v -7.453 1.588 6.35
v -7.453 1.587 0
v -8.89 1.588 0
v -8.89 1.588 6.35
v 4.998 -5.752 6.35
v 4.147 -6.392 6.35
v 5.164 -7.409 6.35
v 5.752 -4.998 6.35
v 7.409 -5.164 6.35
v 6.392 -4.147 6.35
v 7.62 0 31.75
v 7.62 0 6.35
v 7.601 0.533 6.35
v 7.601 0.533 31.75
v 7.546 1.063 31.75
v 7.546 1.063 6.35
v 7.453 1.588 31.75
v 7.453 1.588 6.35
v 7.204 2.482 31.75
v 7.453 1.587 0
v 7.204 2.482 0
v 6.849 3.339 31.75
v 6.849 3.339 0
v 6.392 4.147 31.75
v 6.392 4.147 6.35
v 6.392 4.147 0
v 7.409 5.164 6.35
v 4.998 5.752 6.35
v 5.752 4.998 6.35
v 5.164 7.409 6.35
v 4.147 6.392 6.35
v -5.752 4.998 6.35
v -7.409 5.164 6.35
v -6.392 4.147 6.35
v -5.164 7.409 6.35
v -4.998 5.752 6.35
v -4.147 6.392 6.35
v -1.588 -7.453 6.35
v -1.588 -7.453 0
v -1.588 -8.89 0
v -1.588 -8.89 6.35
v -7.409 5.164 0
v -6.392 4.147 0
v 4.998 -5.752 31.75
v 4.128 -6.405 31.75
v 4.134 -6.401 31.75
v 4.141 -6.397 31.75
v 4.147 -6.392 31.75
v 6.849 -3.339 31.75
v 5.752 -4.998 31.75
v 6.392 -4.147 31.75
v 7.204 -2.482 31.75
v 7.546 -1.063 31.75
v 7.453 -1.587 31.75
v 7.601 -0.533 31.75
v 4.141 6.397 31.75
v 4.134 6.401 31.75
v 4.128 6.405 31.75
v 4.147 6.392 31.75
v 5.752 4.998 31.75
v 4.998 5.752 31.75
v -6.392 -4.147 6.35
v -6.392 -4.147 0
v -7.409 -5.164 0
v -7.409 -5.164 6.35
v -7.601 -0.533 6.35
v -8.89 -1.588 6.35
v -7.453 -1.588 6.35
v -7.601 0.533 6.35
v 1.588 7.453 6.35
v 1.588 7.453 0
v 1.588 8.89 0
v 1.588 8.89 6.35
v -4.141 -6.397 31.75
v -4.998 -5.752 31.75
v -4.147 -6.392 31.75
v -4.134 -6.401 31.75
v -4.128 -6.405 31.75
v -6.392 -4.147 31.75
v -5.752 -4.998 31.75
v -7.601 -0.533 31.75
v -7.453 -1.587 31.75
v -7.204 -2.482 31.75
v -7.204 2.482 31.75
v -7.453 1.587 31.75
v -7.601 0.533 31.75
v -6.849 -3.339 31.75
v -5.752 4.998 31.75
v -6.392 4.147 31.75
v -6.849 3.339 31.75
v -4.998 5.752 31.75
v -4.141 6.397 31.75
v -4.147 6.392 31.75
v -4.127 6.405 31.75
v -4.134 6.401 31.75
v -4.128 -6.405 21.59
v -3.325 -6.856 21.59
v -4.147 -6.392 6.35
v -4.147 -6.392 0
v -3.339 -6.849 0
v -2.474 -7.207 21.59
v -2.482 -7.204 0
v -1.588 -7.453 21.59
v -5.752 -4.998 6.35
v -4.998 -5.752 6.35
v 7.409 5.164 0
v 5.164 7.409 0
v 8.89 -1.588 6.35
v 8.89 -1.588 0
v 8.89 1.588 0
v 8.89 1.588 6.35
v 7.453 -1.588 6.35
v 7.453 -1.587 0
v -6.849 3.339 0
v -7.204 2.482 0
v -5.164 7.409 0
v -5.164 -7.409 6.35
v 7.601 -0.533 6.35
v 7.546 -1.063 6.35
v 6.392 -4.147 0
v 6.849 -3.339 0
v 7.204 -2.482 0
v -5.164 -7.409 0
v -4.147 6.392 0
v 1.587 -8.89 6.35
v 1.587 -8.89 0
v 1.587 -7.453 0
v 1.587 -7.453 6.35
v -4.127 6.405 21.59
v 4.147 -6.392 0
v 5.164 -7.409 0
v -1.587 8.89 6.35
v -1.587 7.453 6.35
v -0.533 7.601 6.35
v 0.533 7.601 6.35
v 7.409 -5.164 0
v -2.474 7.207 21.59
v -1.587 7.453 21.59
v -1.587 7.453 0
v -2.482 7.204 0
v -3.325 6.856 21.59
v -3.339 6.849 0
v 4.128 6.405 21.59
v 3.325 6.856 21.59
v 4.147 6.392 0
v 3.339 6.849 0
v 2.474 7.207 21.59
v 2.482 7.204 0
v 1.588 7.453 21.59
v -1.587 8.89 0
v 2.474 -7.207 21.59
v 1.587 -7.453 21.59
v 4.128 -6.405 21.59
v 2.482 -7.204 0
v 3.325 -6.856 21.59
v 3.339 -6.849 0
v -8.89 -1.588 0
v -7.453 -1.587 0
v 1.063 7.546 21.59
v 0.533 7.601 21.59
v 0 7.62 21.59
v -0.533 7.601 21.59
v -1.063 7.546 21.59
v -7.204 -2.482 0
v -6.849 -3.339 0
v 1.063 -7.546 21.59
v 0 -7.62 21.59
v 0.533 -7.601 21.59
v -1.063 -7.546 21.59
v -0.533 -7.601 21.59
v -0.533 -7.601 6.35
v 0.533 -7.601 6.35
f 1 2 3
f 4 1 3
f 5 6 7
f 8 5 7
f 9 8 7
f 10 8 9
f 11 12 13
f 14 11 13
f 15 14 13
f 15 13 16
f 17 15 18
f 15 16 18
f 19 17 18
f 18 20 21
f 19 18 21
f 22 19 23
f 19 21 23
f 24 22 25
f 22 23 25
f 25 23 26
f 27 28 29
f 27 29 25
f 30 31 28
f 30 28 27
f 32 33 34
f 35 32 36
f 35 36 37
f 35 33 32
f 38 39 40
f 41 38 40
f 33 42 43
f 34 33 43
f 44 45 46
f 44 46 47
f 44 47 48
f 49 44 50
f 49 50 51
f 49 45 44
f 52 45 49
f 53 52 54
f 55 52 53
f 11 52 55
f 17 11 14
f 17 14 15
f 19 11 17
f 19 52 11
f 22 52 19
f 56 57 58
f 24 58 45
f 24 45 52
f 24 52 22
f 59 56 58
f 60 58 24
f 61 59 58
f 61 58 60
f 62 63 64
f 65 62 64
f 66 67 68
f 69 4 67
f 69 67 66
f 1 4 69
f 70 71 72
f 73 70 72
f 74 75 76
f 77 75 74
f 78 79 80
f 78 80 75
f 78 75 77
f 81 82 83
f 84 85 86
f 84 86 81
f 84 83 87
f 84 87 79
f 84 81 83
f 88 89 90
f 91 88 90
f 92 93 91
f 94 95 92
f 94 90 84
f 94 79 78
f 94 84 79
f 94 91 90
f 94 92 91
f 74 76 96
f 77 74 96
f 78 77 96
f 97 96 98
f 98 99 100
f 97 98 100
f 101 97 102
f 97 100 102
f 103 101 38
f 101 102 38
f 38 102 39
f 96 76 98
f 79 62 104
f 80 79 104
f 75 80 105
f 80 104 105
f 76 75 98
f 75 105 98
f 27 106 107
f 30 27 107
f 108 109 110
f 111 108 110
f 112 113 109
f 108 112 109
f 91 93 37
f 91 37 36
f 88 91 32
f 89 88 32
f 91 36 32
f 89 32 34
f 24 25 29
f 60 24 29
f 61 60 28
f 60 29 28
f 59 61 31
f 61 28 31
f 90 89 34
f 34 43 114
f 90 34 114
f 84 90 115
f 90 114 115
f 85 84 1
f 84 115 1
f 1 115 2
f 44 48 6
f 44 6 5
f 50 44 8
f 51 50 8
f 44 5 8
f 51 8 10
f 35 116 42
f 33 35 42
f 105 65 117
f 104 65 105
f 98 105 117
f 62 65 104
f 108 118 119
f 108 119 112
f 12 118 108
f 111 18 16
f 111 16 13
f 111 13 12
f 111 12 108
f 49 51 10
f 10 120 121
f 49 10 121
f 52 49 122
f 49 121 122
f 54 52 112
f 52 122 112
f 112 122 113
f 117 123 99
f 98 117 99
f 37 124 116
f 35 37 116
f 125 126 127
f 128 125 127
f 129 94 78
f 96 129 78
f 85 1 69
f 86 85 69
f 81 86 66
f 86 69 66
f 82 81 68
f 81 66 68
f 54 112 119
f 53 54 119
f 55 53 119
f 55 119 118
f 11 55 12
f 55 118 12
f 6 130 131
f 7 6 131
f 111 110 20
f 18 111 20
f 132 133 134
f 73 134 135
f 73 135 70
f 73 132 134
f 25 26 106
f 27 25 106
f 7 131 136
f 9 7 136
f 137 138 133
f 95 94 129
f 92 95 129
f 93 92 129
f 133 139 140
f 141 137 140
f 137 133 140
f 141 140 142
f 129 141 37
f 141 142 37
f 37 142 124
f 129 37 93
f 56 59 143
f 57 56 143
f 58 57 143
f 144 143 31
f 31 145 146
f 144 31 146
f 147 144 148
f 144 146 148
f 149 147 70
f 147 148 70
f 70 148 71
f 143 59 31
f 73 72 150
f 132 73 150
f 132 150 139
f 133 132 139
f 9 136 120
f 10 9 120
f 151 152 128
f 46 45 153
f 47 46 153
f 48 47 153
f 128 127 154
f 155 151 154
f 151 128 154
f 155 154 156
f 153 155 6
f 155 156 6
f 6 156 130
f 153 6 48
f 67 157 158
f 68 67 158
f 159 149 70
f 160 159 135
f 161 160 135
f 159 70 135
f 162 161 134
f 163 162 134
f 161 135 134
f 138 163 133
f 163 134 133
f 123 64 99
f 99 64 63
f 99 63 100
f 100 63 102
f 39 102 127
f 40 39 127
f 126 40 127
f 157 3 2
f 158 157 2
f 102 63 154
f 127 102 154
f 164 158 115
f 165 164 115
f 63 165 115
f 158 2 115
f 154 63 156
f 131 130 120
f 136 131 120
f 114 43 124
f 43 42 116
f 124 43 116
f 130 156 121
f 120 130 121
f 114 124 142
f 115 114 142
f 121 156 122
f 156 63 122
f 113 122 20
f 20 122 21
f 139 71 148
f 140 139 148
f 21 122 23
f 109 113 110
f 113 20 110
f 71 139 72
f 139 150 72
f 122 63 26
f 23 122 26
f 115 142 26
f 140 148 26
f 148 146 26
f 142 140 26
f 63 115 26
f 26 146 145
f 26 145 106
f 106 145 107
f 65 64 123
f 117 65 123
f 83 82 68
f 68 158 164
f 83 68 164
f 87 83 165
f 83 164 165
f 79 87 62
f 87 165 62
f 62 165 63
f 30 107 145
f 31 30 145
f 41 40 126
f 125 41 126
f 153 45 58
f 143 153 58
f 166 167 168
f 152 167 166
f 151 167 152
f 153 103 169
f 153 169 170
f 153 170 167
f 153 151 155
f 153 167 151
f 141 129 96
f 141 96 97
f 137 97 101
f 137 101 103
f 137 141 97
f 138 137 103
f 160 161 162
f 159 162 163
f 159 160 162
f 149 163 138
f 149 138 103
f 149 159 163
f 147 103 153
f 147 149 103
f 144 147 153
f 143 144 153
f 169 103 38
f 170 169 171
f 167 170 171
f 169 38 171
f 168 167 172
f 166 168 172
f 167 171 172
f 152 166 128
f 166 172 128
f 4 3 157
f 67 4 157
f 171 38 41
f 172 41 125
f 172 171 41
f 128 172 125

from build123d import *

# Parameters (mm, degrees)
F1_DEPTH = 31.75
F2_DEPTH = 6.35
F4_DEPTH = 10.16


with BuildPart() as f1:
    # F0 (on Top) → F1 (new body)
    with BuildSketch(Plane.XY):
        with BuildLine():
            Line((3.8325640626, 1.5875), (7.4528010674, 1.5875))
            ThreePointArc((7.4528010674, 1.5875), (7.0399620464, 2.9160477336), (6.3924582134, 4.1473941203))
            Line((6.3924582134, 4.1473941203), (3.8325640626, 1.5875))
        make_face()
        with BuildLine():
            Line((3.8325640626, 1.5875), (6.3924582134, 4.1473941203))
            ThreePointArc((6.3924582134, 4.1473941203), (5.3881537048, 5.3881536405), (4.1473941966, 6.392458164))
            Line((4.1473941966, 6.392458164), (1.5875000152, 3.8325640132))
            Line((1.5875000152, 3.8325640132), (1.5875000063, 1.5875))
            Line((1.5875000063, 1.5875), (3.8325640626, 1.5875))
        make_face()
        with BuildLine():
            Line((1.5875000152, 3.8325640132), (4.1473941966, 6.392458164))
            ThreePointArc((4.1473941966, 6.392458164), (2.9160477896, 7.0399620232), (1.5875000296, 7.4528010611))
            Line((1.5875000296, 7.4528010611), (1.5875000152, 3.8325640132))
        make_face()
        with BuildLine():
            Line((1.5875000152, 3.8325640132), (1.5875000296, 7.4528010611))
            ThreePointArc((1.5875000296, 7.4528010611), (3.03e-08, 7.62), (-1.5874999704, 7.4528010737))
            Line((-1.5874999704, 7.4528010737), (-1.5874999848, 3.8325640258))
            Line((-1.5874999848, 3.8325640258), (8.9e-09, 2.2450640258))
            Line((8.9e-09, 2.2450640258), (1.5875000152, 3.8325640132))
        make_face()
        with BuildLine():
            Line((-1.5874999848, 3.8325640258), (-1.5874999704, 7.4528010737))
            ThreePointArc((-1.5874999704, 7.4528010737), (-2.9160477336, 7.0399620464), (-4.1473941457, 6.392458197))
            Line((-4.1473941457, 6.392458197), (-1.5874999848, 3.8325640258))
        make_face()
        with BuildLine():
            Line((-1.5874999848, 3.8325640258), (-4.1473941457, 6.392458197))
            ThreePointArc((-4.1473941457, 6.392458197), (-5.3881536619, 5.3881536834), (-6.3924581805, 4.1473941712))
            Line((-6.3924581805, 4.1473941712), (-3.8325640195, 1.5875))
            Line((-3.8325640195, 1.5875), (-1.5874999937, 1.5875))
            Line((-1.5874999937, 1.5875), (-1.5874999848, 3.8325640258))
        make_face()
        with BuildLine():
            Line((-3.8325640195, 1.5875), (-6.3924581805, 4.1473941712))
            ThreePointArc((-6.3924581805, 4.1473941712), (-7.0399620348, 2.9160477616), (-7.4528010674, 1.5875))
            Line((-7.4528010674, 1.5875), (-3.8325640195, 1.5875))
        make_face()
        with BuildLine():
            Line((-2.2450640347, 8.9e-09), (-3.8325640195, 1.5875))
            Line((-3.8325640195, 1.5875), (-7.4528010674, 1.5875))
            ThreePointArc((-7.4528010674, 1.5875), (-7.62, 0), (-7.4528010674, -1.5875))
            Line((-7.4528010674, -1.5875), (-3.8325640626, -1.5875))
            Line((-3.8325640626, -1.5875), (-2.2450640347, 8.9e-09))
        make_face()
        with BuildLine():
            ThreePointArc((-7.4528010674, -1.5875), (-7.0399620464, -2.9160477336), (-6.3924582134, -4.1473941203))
            Line((-6.3924582134, -4.1473941203), (-3.8325640626, -1.5875))
            Line((-3.8325640626, -1.5875), (-7.4528010674, -1.5875))
        make_face()
        with BuildLine():
            ThreePointArc((-6.3924582134, -4.1473941203), (-5.3881537048, -5.3881536405), (-4.1473941966, -6.392458164))
            Line((-4.1473941966, -6.392458164), (-1.5875000152, -3.8325640132))
            Line((-1.5875000152, -3.8325640132), (-1.5875000063, -1.5875))
            Line((-1.5875000063, -1.5875), (-3.8325640626, -1.5875))
            Line((-3.8325640626, -1.5875), (-6.3924582134, -4.1473941203))
        make_face()
        with BuildLine():
            ThreePointArc((-4.1473941966, -6.392458164), (-2.9160477896, -7.0399620232), (-1.5875000296, -7.4528010611))
            Line((-1.5875000296, -7.4528010611), (-1.5875000152, -3.8325640132))
            Line((-1.5875000152, -3.8325640132), (-4.1473941966, -6.392458164))
        make_face()
        with BuildLine():
            ThreePointArc((-1.5875000296, -7.4528010611), (-3.03e-08, -7.62), (1.5874999704, -7.4528010737))
            Line((1.5874999704, -7.4528010737), (1.5874999848, -3.8325640258))
            Line((1.5874999848, -3.8325640258), (-8.9e-09, -2.2450640258))
            Line((-8.9e-09, -2.2450640258), (-1.5875000152, -3.8325640132))
            Line((-1.5875000152, -3.8325640132), (-1.5875000296, -7.4528010611))
        make_face()
        with BuildLine():
            ThreePointArc((1.5874999704, -7.4528010737), (2.9160477336, -7.0399620464), (4.1473941457, -6.392458197))
            Line((4.1473941457, -6.392458197), (1.5874999848, -3.8325640258))
            Line((1.5874999848, -3.8325640258), (1.5874999704, -7.4528010737))
        make_face()
        with BuildLine():
            ThreePointArc((4.1473941457, -6.392458197), (5.3881536619, -5.3881536834), (6.3924581805, -4.1473941712))
            Line((6.3924581805, -4.1473941712), (3.8325640195, -1.5875))
            Line((3.8325640195, -1.5875), (1.5874999937, -1.5875))
            Line((1.5874999937, -1.5875), (1.5874999848, -3.8325640258))
            Line((1.5874999848, -3.8325640258), (4.1473941457, -6.392458197))
        make_face()
        with BuildLine():
            ThreePointArc((6.3924581805, -4.1473941712), (7.0399620348, -2.9160477616), (7.4528010674, -1.5875))
            Line((7.4528010674, -1.5875), (3.8325640195, -1.5875))
            Line((3.8325640195, -1.5875), (6.3924581805, -4.1473941712))
        make_face()
        with BuildLine():
            ThreePointArc((7.4528010674, -1.5875), (7.5780849868, -0.7981402967), (7.62, 0))
            ThreePointArc((7.62, 0), (7.5780849868, 0.7981402967), (7.4528010674, 1.5875))
            Line((7.4528010674, 1.5875), (3.8325640626, 1.5875))
            Line((3.8325640626, 1.5875), (2.2450640347, -8.9e-09))
            Line((2.2450640347, -8.9e-09), (3.8325640195, -1.5875))
            Line((3.8325640195, -1.5875), (7.4528010674, -1.5875))
        make_face()
        Polygon((1.5874999848, -3.8325640258), (1.5874999937, -1.5875), (0.6575640247, -1.5875), (-8.9e-09, -2.2450640258), align=None)
        Polygon((1.5874999937, -1.5875), (3.8325640195, -1.5875), (2.2450640347, -8.9e-09), (1.5874999974, -0.6575640384), align=None)
        Polygon((2.2450640347, -8.9e-09), (3.8325640626, 1.5875), (1.5875000063, 1.5875), (1.5875000026, 0.6575640258), align=None)
        Polygon((0.6575640321, 1.5875), (1.5875000063, 1.5875), (1.5875000152, 3.8325640132), (8.9e-09, 2.2450640258), align=None)
        Polygon((-1.5874999974, 0.6575640384), (-1.5874999937, 1.5875), (-3.8325640195, 1.5875), (-2.2450640347, 8.9e-09), align=None)
        Polygon((-3.8325640626, -1.5875), (-1.5875000063, -1.5875), (-1.5875000026, -0.6575640258), (-2.2450640347, 8.9e-09), align=None)
        Polygon((-1.5875000152, -3.8325640132), (-8.9e-09, -2.2450640258), (-0.6575640321, -1.5875), (-1.5875000063, -1.5875), align=None)
        Polygon((-1.5875000063, -1.5875), (-0.6575640321, -1.5875), (-1.5875000026, -0.6575640258), align=None)
        Polygon((1.5875000026, 0.6575640258), (0.6575640321, 1.5875), (-0.6575640247, 1.5875), (-1.5874999974, 0.6575640384), (-1.5875000026, -0.6575640258), (-0.6575640321, -1.5875), (0.6575640247, -1.5875), (1.5874999974, -0.6575640384), align=None)
        Polygon((0.6575640247, -1.5875), (1.5874999937, -1.5875), (1.5874999974, -0.6575640384), align=None)
        Polygon((1.5874999974, -0.6575640384), (2.2450640347, -8.9e-09), (1.5875000026, 0.6575640258), align=None)
        Polygon((1.5875000026, 0.6575640258), (1.5875000063, 1.5875), (0.6575640321, 1.5875), align=None)
        Polygon((-0.6575640247, 1.5875), (8.9e-09, 2.2450640258), (-1.5874999848, 3.8325640258), (-1.5874999937, 1.5875), align=None)
        Polygon((-1.5874999974, 0.6575640384), (-0.6575640247, 1.5875), (-1.5874999937, 1.5875), align=None)
        Polygon((-0.6575640247, 1.5875), (0.6575640321, 1.5875), (8.9e-09, 2.2450640258), align=None)
        Polygon((-1.5875000026, -0.6575640258), (-1.5874999974, 0.6575640384), (-2.2450640347, 8.9e-09), align=None)
        Polygon((-8.9e-09, -2.2450640258), (0.6575640247, -1.5875), (-0.6575640321, -1.5875), align=None)
    extrude(amount=F1_DEPTH)

    # F0 (on Top) → F2 (join)
    with BuildSketch(Plane.XY):
        with BuildLine():
            ThreePointArc((-7.4528010674, -1.5875), (-7.62, 0), (-7.4528010674, 1.5875))
            Line((-7.4528010674, 1.5875), (-8.89, 1.5875))
            Line((-8.89, 1.5875), (-8.89, -1.5875))
            Line((-8.89, -1.5875), (-7.4528010674, -1.5875))
        make_face()
        with BuildLine():
            ThreePointArc((7.4528010674, 1.5875), (7.5780849868, 0.7981402967), (7.62, 0))
            ThreePointArc((7.62, 0), (7.5780849868, -0.7981402967), (7.4528010674, -1.5875))
            Line((7.4528010674, -1.5875), (8.89, -1.5875))
            Line((8.89, -1.5875), (8.89, 1.5875))
            Line((8.89, 1.5875), (7.4528010674, 1.5875))
        make_face()
        with BuildLine():
            Line((7.4087112896, -5.1636472843), (6.3924581805, -4.1473941712))
            ThreePointArc((6.3924581805, -4.1473941712), (5.3881536619, -5.3881536834), (4.1473941457, -6.392458197))
            Line((4.1473941457, -6.392458197), (5.1636472549, -7.4087113101))
            Line((5.1636472549, -7.4087113101), (7.4087112896, -5.1636472843))
        make_face()
        with BuildLine():
            Line((1.5874999647, -8.8900000063), (1.5874999704, -7.4528010737))
            ThreePointArc((1.5874999704, -7.4528010737), (-3.03e-08, -7.62), (-1.5875000296, -7.4528010611))
            Line((-1.5875000296, -7.4528010611), (-1.5875000353, -8.8899999937))
            Line((-1.5875000353, -8.8899999937), (1.5874999647, -8.8900000063))
        make_face()
        with BuildLine():
            Line((-5.1636473138, -7.4087112691), (-4.1473941966, -6.392458164))
            ThreePointArc((-4.1473941966, -6.392458164), (-5.3881537048, -5.3881536405), (-6.3924582134, -4.1473941203))
            Line((-6.3924582134, -4.1473941203), (-7.4087113307, -5.1636472254))
            Line((-7.4087113307, -5.1636472254), (-5.1636473138, -7.4087112691))
        make_face()
        with BuildLine():
            ThreePointArc((4.1473941966, 6.392458164), (5.3881537048, 5.3881536405), (6.3924582134, 4.1473941203))
            Line((6.3924582134, 4.1473941203), (7.4087113307, 5.1636472254))
            Line((7.4087113307, 5.1636472254), (5.1636473138, 7.4087112691))
            Line((5.1636473138, 7.4087112691), (4.1473941966, 6.392458164))
        make_face()
        with BuildLine():
            ThreePointArc((-1.5874999704, 7.4528010737), (3.03e-08, 7.62), (1.5875000296, 7.4528010611))
            Line((1.5875000296, 7.4528010611), (1.5875000353, 8.8899999937))
            Line((1.5875000353, 8.8899999937), (-1.5874999647, 8.8900000063))
            Line((-1.5874999647, 8.8900000063), (-1.5874999704, 7.4528010737))
        make_face()
        with BuildLine():
            ThreePointArc((-6.3924581805, 4.1473941712), (-5.3881536619, 5.3881536834), (-4.1473941457, 6.392458197))
            Line((-4.1473941457, 6.392458197), (-5.1636472549, 7.4087113101))
            Line((-5.1636472549, 7.4087113101), (-7.4087112896, 5.1636472843))
            Line((-7.4087112896, 5.1636472843), (-6.3924581805, 4.1473941712))
        make_face()
    extrude(amount=F2_DEPTH)

    # F3 (on face) → F4 (cut)
    with BuildSketch(Plane.XY.offset(31.75)):
        with BuildLine():
            ThreePointArc((4.1275, 6.4053215181), (2.1512612617, 7.3100256486), (0, 7.62))
            ThreePointArc((0, 7.62), (-2.1512612617, 7.3100256486), (-4.1275, 6.4053215181))
            Line((-4.1275, 6.4053215181), (-4.1275, -6.4053215181))
            ThreePointArc((-4.1275, -6.4053215181), (-2.1512612665, -7.3100256472), (-9.9e-09, -7.62))
            ThreePointArc((-9.9e-09, -7.62), (2.1512612569, -7.3100256501), (4.1275, -6.4053215181))
            Line((4.1275, -6.4053215181), (4.1275, 6.4053215181))
        make_face()
    extrude(amount=-F4_DEPTH, mode=Mode.SUBTRACT)


solid = f1.part
